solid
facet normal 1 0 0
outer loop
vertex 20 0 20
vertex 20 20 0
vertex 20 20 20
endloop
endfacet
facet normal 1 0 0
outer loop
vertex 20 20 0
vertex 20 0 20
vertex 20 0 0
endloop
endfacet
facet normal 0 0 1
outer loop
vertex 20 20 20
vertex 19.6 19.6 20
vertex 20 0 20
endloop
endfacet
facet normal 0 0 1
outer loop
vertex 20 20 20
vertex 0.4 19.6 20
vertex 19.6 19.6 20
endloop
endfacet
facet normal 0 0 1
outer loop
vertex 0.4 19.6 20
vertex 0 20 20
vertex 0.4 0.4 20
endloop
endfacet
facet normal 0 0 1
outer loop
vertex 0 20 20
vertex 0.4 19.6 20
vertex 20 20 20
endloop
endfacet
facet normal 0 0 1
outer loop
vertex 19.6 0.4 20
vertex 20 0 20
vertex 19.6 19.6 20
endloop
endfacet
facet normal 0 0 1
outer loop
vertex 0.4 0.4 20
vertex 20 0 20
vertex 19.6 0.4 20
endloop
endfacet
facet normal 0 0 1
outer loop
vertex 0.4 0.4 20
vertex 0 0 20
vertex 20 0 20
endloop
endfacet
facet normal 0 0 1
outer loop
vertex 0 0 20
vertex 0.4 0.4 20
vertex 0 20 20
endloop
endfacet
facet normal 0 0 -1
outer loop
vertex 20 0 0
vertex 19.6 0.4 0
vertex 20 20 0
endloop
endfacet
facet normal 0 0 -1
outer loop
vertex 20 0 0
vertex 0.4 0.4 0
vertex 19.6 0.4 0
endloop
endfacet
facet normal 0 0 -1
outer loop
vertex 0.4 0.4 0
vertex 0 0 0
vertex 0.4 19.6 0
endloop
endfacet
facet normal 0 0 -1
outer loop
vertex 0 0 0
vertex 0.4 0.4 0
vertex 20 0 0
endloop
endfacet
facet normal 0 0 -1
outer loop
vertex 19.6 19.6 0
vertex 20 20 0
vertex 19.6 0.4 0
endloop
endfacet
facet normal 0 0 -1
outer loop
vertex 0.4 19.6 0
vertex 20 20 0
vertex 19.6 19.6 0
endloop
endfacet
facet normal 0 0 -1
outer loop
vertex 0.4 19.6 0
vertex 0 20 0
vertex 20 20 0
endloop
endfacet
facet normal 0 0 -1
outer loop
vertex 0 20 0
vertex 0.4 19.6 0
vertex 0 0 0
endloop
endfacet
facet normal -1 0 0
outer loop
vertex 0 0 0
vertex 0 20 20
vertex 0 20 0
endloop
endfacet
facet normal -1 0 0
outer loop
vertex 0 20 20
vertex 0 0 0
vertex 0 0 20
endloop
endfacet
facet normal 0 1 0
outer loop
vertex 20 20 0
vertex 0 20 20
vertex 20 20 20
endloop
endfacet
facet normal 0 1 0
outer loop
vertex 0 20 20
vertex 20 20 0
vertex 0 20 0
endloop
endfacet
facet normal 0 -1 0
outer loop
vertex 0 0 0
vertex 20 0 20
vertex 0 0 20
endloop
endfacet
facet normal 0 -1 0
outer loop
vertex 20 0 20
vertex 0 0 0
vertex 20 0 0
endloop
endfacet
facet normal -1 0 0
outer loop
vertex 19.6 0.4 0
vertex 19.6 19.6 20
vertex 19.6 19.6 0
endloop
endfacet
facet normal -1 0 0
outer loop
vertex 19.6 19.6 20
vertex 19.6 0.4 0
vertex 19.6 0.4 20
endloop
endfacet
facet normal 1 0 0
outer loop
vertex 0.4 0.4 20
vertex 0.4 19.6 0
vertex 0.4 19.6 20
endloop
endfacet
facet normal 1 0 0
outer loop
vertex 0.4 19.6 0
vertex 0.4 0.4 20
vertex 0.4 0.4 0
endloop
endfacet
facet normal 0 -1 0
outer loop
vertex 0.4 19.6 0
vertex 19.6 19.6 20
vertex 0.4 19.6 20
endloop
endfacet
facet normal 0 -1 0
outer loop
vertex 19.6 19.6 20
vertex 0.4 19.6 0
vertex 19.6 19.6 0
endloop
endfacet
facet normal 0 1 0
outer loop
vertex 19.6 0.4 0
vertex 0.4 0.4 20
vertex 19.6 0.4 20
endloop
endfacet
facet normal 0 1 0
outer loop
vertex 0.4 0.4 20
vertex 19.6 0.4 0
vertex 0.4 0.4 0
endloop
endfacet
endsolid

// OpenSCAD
w=0.4;

difference()
{
  cube([20, 20, 20]);
  translate([w,w,0])
    cube([20-2*w, 20-2*w, 20]);
}
